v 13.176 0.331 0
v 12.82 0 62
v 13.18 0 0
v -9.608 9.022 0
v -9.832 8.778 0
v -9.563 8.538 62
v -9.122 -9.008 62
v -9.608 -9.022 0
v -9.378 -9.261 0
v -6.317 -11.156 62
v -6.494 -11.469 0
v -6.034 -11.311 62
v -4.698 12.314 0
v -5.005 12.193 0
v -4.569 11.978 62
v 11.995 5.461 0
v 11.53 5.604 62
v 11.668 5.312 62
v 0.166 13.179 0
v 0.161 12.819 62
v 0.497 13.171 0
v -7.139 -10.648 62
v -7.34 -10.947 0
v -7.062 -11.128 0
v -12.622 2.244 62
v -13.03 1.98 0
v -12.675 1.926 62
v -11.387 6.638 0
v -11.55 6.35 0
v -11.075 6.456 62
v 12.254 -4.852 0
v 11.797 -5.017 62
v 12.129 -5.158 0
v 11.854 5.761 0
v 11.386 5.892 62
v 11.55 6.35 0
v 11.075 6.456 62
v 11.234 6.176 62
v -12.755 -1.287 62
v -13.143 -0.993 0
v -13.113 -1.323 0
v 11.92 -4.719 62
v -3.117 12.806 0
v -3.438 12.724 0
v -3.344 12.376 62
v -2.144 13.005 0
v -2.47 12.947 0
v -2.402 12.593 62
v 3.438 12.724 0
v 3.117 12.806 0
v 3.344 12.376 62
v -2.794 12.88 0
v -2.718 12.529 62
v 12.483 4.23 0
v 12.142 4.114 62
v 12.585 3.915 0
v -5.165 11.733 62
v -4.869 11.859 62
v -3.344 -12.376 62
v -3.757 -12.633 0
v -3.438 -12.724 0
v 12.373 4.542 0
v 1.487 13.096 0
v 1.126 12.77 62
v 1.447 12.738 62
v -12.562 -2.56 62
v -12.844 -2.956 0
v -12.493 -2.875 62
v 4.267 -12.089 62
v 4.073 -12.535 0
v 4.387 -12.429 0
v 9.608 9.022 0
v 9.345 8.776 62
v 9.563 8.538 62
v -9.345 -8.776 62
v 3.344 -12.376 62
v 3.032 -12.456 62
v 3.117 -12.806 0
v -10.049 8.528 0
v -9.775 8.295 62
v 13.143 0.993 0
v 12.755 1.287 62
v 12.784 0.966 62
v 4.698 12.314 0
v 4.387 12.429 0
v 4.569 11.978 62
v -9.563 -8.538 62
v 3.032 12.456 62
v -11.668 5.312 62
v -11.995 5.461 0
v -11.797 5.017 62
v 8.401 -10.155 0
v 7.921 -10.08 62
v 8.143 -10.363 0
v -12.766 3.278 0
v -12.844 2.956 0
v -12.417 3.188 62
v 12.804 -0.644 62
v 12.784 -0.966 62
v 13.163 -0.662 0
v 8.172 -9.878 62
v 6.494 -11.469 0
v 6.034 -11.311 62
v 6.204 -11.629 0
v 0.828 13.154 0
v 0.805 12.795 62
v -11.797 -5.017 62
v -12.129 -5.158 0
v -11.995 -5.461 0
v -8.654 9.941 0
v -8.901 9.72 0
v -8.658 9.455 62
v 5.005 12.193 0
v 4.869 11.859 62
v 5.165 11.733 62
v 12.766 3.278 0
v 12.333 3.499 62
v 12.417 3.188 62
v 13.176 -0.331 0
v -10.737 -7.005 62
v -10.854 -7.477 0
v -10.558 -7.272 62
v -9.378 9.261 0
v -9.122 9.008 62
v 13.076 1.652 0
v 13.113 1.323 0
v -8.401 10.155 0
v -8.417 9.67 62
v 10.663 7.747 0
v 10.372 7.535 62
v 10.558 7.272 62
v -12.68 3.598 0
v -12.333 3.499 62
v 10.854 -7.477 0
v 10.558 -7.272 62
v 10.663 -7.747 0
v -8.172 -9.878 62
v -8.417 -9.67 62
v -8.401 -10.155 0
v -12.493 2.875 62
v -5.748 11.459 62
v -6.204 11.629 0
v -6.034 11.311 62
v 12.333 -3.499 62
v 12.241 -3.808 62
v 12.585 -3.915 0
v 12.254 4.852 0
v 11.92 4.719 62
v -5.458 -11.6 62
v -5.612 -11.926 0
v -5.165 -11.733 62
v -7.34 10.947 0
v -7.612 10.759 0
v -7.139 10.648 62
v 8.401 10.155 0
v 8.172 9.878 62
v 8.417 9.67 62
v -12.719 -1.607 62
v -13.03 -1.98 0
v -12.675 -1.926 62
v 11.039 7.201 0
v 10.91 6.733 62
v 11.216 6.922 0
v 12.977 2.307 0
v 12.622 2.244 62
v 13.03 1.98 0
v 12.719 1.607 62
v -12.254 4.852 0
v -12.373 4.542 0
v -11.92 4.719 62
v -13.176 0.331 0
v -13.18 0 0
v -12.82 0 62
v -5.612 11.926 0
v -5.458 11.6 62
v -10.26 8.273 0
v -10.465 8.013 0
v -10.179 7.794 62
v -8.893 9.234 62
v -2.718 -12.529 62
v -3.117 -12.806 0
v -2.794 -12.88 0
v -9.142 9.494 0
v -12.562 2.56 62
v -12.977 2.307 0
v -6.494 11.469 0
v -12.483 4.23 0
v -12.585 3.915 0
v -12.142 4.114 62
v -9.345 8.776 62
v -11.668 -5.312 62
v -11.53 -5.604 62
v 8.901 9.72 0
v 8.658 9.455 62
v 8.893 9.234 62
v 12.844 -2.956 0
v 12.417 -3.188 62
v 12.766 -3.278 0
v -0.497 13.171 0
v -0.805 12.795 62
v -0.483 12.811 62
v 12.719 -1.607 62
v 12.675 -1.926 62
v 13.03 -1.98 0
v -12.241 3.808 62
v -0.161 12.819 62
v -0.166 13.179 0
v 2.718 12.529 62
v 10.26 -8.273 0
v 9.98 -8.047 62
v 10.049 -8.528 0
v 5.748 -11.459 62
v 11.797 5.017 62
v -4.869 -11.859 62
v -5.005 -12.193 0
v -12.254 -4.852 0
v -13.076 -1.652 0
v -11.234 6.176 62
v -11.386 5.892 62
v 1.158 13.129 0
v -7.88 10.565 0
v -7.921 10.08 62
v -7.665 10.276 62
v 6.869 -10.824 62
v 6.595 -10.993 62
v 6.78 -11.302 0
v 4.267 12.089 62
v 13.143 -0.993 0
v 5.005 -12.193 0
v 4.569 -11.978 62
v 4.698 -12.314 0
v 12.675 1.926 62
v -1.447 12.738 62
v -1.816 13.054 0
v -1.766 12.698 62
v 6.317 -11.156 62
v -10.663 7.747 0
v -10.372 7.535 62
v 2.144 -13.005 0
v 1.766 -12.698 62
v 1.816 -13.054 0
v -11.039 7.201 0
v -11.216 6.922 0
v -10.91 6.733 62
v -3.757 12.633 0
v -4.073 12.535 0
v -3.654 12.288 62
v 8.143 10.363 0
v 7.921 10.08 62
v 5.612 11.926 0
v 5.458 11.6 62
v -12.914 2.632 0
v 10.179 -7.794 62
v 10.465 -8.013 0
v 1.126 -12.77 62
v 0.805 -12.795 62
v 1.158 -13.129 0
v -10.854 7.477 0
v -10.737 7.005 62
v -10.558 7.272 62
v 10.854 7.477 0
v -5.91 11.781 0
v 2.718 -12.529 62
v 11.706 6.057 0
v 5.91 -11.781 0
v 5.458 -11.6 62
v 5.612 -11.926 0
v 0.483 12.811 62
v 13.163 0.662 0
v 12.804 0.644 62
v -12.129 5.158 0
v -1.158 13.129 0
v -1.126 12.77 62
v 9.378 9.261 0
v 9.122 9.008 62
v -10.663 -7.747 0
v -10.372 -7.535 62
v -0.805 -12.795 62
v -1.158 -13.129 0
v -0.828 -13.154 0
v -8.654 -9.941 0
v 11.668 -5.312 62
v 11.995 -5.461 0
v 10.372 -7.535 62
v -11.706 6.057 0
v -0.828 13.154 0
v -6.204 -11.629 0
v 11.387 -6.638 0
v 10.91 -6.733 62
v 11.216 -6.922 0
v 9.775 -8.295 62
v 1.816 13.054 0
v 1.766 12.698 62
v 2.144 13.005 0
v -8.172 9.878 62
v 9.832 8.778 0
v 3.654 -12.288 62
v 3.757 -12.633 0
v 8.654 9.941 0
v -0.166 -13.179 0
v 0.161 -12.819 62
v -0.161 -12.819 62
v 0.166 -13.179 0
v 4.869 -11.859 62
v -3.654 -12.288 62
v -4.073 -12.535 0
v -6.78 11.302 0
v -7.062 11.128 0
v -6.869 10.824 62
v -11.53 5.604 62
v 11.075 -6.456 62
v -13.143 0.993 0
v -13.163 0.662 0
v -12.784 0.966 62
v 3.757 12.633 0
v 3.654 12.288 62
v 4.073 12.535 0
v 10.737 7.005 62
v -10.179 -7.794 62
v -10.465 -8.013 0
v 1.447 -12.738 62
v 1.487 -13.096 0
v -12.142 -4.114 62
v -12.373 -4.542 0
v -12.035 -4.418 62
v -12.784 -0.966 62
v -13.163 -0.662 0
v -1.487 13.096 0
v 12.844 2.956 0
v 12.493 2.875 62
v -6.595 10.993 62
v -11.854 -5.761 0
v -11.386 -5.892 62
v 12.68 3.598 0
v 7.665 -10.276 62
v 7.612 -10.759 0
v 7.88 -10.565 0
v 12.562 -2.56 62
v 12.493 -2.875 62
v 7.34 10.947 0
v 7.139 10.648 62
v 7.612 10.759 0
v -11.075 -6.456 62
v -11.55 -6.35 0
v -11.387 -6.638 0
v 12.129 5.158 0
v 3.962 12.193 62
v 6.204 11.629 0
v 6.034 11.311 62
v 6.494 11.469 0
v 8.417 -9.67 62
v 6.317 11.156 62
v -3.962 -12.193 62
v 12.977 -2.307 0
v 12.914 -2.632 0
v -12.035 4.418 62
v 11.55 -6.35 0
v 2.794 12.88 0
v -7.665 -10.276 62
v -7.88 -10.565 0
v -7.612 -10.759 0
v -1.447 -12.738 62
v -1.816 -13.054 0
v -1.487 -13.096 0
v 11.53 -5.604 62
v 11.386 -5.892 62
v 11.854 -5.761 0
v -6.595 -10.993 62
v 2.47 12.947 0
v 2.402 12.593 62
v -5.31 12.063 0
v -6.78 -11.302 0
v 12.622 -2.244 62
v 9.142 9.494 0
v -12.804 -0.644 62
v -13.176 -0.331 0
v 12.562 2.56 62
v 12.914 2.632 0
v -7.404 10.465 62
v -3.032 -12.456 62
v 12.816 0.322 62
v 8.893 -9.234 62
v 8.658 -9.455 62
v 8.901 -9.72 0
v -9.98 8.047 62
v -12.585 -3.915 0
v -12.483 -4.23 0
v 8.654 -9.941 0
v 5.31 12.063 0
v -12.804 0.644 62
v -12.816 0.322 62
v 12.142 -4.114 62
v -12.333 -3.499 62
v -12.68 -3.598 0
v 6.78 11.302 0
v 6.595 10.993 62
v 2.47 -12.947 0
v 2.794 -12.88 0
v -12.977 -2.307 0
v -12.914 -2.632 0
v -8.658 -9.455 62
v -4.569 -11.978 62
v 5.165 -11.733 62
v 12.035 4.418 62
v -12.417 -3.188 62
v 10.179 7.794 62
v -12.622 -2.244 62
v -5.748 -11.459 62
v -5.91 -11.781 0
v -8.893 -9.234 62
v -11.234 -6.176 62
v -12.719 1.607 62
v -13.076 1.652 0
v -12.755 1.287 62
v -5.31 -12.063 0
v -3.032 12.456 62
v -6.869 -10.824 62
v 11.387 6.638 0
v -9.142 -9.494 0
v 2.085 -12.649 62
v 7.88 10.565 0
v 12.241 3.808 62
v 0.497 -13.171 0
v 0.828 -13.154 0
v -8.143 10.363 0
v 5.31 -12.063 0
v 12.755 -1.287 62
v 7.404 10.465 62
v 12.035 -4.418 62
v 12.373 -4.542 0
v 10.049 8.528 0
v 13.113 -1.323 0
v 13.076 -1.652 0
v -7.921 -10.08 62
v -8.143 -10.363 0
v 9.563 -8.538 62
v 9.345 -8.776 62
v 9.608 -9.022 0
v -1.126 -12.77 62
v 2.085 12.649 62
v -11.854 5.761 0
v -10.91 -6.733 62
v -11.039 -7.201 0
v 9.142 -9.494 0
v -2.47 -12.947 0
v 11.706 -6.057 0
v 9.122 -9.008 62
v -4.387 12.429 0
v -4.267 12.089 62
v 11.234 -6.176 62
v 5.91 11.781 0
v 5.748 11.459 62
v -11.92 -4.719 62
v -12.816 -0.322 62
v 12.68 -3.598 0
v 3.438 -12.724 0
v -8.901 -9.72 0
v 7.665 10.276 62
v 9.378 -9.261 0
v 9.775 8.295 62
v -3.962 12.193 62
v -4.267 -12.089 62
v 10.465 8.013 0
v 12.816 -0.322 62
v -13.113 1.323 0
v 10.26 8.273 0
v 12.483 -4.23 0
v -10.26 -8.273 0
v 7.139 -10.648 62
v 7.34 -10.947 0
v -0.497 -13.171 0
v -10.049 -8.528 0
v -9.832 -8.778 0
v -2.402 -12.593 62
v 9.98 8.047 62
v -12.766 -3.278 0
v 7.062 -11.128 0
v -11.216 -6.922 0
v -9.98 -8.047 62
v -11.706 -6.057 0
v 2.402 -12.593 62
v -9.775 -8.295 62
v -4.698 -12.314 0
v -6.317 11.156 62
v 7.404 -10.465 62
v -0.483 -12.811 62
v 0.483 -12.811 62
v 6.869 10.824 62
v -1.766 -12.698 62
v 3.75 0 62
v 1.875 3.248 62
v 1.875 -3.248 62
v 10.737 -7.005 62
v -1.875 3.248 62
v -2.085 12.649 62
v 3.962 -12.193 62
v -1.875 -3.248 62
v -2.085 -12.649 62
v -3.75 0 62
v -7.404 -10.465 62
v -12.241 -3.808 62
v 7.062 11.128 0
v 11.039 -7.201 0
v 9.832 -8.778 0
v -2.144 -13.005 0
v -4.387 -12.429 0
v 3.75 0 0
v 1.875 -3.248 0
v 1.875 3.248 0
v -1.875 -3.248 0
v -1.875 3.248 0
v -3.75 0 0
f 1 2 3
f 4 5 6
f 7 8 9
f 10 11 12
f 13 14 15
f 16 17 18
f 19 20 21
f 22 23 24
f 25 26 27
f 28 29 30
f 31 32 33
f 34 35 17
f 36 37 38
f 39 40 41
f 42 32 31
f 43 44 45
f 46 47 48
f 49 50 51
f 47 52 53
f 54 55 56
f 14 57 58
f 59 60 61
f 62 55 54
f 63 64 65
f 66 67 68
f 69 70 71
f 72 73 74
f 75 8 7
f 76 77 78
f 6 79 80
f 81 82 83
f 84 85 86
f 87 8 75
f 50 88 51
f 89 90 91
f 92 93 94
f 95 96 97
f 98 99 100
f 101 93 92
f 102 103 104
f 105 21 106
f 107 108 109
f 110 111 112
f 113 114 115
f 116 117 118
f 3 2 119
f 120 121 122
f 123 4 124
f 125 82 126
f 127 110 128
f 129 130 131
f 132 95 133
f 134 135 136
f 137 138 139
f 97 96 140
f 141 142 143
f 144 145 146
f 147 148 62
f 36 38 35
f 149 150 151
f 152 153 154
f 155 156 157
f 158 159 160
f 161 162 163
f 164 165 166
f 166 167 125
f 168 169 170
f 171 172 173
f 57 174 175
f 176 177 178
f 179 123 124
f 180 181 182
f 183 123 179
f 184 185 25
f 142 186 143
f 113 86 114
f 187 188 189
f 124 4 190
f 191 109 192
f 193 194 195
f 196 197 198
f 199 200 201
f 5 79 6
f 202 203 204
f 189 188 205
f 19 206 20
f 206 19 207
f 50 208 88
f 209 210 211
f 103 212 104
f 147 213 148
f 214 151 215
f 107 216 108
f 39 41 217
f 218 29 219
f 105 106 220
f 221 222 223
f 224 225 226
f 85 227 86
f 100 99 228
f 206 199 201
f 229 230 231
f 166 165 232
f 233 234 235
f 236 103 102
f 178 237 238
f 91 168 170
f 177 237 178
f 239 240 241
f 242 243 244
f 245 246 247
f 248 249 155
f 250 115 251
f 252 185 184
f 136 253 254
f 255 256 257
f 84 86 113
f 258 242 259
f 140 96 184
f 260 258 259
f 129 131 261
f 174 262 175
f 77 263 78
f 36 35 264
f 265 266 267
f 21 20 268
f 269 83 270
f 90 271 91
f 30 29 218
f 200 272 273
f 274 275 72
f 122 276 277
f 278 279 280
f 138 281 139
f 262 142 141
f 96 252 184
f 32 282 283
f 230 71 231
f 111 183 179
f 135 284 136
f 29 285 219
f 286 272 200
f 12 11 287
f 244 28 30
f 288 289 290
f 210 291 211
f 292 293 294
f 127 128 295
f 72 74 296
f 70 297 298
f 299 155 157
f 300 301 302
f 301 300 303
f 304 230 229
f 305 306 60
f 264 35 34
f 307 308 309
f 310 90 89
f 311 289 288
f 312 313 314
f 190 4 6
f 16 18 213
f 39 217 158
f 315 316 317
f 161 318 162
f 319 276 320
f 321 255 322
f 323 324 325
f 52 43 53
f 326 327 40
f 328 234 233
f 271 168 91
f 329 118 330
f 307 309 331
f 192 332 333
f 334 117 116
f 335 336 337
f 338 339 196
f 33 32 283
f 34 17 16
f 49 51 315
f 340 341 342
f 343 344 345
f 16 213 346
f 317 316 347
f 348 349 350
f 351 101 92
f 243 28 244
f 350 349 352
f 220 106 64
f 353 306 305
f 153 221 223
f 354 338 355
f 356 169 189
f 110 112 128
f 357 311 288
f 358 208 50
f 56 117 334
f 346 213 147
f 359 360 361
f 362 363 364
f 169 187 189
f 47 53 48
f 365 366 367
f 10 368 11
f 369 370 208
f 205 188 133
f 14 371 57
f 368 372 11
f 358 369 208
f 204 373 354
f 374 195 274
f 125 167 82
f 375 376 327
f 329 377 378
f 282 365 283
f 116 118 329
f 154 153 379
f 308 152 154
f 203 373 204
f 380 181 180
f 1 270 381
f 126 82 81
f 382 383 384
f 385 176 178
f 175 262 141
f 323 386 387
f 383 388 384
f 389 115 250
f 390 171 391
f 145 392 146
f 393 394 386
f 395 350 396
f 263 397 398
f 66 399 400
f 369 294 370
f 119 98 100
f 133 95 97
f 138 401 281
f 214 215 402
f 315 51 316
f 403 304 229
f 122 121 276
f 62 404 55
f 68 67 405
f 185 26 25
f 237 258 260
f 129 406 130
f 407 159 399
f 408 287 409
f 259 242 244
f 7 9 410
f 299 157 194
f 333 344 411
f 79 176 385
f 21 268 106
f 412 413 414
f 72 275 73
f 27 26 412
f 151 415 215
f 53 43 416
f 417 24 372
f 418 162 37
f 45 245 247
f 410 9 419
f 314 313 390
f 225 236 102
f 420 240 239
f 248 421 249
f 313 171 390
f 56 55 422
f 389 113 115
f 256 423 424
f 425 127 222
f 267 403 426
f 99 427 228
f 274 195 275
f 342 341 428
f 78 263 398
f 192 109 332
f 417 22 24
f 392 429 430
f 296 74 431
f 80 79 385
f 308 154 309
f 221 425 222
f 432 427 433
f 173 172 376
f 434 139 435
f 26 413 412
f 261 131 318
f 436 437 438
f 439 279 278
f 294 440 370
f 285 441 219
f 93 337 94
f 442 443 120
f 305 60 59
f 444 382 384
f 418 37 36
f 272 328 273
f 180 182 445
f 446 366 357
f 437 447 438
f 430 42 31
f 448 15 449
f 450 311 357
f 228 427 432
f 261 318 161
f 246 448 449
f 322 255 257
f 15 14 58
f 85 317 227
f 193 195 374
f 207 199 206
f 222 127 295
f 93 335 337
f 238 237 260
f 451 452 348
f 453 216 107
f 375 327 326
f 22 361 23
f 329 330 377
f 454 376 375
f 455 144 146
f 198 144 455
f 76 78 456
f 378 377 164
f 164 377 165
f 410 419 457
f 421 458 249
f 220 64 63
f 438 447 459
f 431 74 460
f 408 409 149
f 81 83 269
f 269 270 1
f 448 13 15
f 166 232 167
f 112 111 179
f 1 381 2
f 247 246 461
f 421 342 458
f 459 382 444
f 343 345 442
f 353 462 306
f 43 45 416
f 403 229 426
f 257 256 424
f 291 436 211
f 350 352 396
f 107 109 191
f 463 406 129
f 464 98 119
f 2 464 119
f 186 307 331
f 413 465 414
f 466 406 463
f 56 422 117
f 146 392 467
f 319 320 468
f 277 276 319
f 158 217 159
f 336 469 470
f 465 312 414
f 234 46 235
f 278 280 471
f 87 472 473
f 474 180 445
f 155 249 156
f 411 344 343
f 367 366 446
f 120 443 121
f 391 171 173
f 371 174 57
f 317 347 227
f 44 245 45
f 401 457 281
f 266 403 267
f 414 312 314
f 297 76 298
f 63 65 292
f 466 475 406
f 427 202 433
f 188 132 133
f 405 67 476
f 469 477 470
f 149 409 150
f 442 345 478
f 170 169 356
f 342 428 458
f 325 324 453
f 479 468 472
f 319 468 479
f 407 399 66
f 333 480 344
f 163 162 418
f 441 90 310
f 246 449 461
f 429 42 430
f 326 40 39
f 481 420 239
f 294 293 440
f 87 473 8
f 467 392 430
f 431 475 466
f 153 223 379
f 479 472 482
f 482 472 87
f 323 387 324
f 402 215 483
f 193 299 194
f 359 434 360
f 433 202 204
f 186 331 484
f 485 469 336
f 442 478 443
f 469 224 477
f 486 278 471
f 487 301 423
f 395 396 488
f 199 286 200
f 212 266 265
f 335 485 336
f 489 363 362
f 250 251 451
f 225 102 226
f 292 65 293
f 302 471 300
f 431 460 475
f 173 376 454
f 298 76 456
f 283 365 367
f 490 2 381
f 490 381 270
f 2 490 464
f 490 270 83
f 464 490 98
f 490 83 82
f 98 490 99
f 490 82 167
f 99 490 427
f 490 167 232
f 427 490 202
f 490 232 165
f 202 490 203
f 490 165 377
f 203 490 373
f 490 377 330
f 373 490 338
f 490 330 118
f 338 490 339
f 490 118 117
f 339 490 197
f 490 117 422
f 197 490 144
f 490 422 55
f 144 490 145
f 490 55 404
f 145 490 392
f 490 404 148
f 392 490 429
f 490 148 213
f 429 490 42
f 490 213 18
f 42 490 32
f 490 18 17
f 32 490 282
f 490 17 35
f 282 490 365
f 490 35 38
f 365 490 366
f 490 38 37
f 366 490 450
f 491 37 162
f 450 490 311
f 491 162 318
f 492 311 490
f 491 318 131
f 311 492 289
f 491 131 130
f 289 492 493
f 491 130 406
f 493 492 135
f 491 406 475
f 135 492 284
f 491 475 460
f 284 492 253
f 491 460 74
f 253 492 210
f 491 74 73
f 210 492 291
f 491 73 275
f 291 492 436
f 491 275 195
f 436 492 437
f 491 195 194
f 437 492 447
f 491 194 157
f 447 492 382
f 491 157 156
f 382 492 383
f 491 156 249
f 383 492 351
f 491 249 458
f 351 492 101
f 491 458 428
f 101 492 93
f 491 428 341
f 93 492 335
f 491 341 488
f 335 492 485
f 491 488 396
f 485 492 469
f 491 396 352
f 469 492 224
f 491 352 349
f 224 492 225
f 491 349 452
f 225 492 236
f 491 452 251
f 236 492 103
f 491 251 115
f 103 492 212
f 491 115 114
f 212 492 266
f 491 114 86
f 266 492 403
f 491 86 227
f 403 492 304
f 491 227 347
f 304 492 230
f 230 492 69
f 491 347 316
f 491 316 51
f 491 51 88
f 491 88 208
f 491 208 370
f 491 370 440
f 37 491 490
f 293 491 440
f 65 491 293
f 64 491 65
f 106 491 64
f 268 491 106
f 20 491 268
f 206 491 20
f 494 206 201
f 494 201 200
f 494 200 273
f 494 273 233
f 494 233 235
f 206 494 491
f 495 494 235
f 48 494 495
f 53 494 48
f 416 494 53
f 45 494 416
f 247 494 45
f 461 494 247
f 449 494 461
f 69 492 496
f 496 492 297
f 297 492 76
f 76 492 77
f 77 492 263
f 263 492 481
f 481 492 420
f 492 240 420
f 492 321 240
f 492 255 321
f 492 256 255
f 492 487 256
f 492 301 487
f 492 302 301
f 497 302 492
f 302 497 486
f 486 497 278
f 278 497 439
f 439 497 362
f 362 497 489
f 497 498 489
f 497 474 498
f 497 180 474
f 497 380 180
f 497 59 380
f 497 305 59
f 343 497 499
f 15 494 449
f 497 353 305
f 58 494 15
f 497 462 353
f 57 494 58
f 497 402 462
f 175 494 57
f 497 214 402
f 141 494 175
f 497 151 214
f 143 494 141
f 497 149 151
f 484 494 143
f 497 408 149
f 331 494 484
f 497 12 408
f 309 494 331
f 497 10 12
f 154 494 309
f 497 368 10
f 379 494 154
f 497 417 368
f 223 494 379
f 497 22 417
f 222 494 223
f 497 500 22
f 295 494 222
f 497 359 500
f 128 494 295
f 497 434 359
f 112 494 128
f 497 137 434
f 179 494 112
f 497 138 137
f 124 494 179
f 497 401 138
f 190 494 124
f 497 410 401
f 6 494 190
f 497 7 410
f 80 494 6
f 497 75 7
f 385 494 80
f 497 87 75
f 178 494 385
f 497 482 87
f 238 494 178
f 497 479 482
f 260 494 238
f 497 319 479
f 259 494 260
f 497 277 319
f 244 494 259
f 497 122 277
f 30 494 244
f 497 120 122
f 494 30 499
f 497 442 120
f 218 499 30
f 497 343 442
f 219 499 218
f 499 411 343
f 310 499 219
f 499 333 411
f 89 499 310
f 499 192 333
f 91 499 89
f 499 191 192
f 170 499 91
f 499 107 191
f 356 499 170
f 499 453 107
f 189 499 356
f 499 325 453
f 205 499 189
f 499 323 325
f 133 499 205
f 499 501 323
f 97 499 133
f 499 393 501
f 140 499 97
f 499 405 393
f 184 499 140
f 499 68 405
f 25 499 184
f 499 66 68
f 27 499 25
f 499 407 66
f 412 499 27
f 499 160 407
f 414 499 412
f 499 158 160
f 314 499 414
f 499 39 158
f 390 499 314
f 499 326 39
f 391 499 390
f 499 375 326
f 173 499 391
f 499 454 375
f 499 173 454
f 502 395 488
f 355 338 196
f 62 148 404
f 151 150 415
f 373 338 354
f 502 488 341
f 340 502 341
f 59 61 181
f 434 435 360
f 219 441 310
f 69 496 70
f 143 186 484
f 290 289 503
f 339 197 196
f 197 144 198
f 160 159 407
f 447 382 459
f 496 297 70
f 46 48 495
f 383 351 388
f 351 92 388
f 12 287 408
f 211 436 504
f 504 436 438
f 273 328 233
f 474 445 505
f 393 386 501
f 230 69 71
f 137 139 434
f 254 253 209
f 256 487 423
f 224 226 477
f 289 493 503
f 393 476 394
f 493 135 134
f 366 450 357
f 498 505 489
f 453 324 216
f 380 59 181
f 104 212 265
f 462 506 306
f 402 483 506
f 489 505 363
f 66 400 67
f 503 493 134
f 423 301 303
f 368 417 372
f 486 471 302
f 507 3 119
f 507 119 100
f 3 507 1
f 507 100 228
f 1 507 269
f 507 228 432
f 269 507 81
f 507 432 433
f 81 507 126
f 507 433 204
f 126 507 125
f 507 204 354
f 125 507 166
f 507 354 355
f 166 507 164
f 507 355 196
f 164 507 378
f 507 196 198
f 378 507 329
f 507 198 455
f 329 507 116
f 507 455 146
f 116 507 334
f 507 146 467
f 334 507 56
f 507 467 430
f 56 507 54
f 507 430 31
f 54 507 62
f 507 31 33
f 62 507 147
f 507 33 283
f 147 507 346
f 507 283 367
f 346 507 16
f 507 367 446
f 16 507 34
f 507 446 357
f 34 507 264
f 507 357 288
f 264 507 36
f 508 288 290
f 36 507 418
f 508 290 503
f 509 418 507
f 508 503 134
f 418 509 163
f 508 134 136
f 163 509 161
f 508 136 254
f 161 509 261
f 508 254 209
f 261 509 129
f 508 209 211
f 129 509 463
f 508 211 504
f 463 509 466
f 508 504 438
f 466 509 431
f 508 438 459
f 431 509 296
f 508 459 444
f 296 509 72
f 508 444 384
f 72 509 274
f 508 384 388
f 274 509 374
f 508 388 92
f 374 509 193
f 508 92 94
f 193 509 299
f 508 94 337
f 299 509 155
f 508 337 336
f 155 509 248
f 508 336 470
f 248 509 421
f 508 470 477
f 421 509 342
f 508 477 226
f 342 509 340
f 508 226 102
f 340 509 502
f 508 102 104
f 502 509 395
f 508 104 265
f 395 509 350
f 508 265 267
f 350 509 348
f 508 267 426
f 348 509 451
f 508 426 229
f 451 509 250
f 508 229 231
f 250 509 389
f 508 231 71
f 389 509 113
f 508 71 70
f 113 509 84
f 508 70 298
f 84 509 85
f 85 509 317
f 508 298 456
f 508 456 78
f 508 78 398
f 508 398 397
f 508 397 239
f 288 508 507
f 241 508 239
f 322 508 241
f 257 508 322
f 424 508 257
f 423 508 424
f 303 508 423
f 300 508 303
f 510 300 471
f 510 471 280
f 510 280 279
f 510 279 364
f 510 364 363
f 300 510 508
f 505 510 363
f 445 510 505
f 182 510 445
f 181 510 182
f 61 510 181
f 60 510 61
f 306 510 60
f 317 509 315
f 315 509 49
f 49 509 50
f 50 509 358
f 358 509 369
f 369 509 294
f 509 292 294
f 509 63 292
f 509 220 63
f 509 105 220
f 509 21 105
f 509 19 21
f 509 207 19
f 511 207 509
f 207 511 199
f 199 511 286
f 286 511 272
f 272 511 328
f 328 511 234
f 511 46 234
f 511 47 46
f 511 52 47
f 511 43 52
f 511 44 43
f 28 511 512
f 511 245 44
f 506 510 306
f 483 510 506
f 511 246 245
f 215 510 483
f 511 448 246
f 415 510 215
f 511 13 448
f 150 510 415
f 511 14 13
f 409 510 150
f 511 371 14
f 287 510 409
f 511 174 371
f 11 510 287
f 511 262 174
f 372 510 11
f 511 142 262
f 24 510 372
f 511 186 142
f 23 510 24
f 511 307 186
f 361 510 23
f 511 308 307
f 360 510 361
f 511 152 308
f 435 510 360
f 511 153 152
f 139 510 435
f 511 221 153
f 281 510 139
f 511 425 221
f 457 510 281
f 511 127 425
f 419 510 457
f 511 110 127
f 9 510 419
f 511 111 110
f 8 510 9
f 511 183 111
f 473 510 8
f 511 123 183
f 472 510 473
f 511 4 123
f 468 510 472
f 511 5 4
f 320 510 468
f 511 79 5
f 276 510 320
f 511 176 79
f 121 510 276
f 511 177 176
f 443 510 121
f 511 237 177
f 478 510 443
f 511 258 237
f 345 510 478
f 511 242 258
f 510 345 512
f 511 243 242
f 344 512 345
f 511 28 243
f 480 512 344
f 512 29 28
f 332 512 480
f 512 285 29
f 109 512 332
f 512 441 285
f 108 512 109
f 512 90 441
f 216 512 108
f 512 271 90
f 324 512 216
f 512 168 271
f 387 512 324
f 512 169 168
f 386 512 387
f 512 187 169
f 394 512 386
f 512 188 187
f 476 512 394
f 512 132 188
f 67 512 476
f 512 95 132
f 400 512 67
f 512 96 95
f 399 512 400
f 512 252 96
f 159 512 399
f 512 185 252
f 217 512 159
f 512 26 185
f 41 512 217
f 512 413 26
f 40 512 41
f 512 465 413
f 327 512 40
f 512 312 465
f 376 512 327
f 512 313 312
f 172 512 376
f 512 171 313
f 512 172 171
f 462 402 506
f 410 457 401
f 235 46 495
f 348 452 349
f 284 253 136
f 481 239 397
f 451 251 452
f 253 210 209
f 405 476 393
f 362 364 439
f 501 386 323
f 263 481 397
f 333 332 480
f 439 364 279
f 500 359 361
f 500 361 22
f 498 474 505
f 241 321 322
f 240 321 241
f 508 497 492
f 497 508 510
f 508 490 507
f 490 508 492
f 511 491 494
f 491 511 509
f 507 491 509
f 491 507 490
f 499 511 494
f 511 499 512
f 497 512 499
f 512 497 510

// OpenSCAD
rHollowCenter = 13;
rBlades = 35;
lWall = 2.6;
hSpool = 62;
hIntersect = 5;
dSixEdgeKey = 7.5;

module endOfConfigsNop() {}

cadFix = 0.005;
$fn = 250;

rCenter = rHollowCenter + lWall;
hHalfSpool = (hSpool + hIntersect) / 2;
lGap = 0.06;



module baseBody() {
    cylinder(lWall, r = rBlades);
    cylinder(hHalfSpool, r = rCenter);
}

module body() {
    difference() {
        baseBody();
        translate([0, 0, - cadFix])
            cylinder(hHalfSpool + 2 * cadFix, r = rHollowCenter);
        translate([rHollowCenter, 0, 0])
            sphere(5);
    }
}

module bodyWithOuterIntersect() {
    difference() {
        body();
        translate([0, 0, (hSpool - hIntersect) / 2])
            cylinder(hHalfSpool, r = rHollowCenter + lWall / 2 + lGap);
    }
}

module bodyWithInnerIntersect() {
    difference() {
        body();
        translate([0, 0, (hSpool - hIntersect) / 2])
            difference() {
                cylinder(hHalfSpool, r = rCenter + cadFix);
                cylinder(hHalfSpool, r = rHollowCenter + lWall / 2 - lGap);
            }
    }
}

module windingAdapter() {
    difference() {
        cylinder(hSpool, r1 = rHollowCenter + 3 * lGap, r2 = rHollowCenter - 3 * lGap);
        translate([0,0,-cadFix])
            cylinder(hSpool + 2*cadFix, d=dSixEdgeKey, $fn=6);
    }
}

//bodyWithInnerIntersect();
//bodyWithOuterIntersect();
windingAdapter();

module paintBodyWithOuterIntersectForTotal() {
    color("red")
        translate([0, 0, hSpool + cadFix])
            rotate([180, 0, 0])
                bodyWithOuterIntersect();
}
